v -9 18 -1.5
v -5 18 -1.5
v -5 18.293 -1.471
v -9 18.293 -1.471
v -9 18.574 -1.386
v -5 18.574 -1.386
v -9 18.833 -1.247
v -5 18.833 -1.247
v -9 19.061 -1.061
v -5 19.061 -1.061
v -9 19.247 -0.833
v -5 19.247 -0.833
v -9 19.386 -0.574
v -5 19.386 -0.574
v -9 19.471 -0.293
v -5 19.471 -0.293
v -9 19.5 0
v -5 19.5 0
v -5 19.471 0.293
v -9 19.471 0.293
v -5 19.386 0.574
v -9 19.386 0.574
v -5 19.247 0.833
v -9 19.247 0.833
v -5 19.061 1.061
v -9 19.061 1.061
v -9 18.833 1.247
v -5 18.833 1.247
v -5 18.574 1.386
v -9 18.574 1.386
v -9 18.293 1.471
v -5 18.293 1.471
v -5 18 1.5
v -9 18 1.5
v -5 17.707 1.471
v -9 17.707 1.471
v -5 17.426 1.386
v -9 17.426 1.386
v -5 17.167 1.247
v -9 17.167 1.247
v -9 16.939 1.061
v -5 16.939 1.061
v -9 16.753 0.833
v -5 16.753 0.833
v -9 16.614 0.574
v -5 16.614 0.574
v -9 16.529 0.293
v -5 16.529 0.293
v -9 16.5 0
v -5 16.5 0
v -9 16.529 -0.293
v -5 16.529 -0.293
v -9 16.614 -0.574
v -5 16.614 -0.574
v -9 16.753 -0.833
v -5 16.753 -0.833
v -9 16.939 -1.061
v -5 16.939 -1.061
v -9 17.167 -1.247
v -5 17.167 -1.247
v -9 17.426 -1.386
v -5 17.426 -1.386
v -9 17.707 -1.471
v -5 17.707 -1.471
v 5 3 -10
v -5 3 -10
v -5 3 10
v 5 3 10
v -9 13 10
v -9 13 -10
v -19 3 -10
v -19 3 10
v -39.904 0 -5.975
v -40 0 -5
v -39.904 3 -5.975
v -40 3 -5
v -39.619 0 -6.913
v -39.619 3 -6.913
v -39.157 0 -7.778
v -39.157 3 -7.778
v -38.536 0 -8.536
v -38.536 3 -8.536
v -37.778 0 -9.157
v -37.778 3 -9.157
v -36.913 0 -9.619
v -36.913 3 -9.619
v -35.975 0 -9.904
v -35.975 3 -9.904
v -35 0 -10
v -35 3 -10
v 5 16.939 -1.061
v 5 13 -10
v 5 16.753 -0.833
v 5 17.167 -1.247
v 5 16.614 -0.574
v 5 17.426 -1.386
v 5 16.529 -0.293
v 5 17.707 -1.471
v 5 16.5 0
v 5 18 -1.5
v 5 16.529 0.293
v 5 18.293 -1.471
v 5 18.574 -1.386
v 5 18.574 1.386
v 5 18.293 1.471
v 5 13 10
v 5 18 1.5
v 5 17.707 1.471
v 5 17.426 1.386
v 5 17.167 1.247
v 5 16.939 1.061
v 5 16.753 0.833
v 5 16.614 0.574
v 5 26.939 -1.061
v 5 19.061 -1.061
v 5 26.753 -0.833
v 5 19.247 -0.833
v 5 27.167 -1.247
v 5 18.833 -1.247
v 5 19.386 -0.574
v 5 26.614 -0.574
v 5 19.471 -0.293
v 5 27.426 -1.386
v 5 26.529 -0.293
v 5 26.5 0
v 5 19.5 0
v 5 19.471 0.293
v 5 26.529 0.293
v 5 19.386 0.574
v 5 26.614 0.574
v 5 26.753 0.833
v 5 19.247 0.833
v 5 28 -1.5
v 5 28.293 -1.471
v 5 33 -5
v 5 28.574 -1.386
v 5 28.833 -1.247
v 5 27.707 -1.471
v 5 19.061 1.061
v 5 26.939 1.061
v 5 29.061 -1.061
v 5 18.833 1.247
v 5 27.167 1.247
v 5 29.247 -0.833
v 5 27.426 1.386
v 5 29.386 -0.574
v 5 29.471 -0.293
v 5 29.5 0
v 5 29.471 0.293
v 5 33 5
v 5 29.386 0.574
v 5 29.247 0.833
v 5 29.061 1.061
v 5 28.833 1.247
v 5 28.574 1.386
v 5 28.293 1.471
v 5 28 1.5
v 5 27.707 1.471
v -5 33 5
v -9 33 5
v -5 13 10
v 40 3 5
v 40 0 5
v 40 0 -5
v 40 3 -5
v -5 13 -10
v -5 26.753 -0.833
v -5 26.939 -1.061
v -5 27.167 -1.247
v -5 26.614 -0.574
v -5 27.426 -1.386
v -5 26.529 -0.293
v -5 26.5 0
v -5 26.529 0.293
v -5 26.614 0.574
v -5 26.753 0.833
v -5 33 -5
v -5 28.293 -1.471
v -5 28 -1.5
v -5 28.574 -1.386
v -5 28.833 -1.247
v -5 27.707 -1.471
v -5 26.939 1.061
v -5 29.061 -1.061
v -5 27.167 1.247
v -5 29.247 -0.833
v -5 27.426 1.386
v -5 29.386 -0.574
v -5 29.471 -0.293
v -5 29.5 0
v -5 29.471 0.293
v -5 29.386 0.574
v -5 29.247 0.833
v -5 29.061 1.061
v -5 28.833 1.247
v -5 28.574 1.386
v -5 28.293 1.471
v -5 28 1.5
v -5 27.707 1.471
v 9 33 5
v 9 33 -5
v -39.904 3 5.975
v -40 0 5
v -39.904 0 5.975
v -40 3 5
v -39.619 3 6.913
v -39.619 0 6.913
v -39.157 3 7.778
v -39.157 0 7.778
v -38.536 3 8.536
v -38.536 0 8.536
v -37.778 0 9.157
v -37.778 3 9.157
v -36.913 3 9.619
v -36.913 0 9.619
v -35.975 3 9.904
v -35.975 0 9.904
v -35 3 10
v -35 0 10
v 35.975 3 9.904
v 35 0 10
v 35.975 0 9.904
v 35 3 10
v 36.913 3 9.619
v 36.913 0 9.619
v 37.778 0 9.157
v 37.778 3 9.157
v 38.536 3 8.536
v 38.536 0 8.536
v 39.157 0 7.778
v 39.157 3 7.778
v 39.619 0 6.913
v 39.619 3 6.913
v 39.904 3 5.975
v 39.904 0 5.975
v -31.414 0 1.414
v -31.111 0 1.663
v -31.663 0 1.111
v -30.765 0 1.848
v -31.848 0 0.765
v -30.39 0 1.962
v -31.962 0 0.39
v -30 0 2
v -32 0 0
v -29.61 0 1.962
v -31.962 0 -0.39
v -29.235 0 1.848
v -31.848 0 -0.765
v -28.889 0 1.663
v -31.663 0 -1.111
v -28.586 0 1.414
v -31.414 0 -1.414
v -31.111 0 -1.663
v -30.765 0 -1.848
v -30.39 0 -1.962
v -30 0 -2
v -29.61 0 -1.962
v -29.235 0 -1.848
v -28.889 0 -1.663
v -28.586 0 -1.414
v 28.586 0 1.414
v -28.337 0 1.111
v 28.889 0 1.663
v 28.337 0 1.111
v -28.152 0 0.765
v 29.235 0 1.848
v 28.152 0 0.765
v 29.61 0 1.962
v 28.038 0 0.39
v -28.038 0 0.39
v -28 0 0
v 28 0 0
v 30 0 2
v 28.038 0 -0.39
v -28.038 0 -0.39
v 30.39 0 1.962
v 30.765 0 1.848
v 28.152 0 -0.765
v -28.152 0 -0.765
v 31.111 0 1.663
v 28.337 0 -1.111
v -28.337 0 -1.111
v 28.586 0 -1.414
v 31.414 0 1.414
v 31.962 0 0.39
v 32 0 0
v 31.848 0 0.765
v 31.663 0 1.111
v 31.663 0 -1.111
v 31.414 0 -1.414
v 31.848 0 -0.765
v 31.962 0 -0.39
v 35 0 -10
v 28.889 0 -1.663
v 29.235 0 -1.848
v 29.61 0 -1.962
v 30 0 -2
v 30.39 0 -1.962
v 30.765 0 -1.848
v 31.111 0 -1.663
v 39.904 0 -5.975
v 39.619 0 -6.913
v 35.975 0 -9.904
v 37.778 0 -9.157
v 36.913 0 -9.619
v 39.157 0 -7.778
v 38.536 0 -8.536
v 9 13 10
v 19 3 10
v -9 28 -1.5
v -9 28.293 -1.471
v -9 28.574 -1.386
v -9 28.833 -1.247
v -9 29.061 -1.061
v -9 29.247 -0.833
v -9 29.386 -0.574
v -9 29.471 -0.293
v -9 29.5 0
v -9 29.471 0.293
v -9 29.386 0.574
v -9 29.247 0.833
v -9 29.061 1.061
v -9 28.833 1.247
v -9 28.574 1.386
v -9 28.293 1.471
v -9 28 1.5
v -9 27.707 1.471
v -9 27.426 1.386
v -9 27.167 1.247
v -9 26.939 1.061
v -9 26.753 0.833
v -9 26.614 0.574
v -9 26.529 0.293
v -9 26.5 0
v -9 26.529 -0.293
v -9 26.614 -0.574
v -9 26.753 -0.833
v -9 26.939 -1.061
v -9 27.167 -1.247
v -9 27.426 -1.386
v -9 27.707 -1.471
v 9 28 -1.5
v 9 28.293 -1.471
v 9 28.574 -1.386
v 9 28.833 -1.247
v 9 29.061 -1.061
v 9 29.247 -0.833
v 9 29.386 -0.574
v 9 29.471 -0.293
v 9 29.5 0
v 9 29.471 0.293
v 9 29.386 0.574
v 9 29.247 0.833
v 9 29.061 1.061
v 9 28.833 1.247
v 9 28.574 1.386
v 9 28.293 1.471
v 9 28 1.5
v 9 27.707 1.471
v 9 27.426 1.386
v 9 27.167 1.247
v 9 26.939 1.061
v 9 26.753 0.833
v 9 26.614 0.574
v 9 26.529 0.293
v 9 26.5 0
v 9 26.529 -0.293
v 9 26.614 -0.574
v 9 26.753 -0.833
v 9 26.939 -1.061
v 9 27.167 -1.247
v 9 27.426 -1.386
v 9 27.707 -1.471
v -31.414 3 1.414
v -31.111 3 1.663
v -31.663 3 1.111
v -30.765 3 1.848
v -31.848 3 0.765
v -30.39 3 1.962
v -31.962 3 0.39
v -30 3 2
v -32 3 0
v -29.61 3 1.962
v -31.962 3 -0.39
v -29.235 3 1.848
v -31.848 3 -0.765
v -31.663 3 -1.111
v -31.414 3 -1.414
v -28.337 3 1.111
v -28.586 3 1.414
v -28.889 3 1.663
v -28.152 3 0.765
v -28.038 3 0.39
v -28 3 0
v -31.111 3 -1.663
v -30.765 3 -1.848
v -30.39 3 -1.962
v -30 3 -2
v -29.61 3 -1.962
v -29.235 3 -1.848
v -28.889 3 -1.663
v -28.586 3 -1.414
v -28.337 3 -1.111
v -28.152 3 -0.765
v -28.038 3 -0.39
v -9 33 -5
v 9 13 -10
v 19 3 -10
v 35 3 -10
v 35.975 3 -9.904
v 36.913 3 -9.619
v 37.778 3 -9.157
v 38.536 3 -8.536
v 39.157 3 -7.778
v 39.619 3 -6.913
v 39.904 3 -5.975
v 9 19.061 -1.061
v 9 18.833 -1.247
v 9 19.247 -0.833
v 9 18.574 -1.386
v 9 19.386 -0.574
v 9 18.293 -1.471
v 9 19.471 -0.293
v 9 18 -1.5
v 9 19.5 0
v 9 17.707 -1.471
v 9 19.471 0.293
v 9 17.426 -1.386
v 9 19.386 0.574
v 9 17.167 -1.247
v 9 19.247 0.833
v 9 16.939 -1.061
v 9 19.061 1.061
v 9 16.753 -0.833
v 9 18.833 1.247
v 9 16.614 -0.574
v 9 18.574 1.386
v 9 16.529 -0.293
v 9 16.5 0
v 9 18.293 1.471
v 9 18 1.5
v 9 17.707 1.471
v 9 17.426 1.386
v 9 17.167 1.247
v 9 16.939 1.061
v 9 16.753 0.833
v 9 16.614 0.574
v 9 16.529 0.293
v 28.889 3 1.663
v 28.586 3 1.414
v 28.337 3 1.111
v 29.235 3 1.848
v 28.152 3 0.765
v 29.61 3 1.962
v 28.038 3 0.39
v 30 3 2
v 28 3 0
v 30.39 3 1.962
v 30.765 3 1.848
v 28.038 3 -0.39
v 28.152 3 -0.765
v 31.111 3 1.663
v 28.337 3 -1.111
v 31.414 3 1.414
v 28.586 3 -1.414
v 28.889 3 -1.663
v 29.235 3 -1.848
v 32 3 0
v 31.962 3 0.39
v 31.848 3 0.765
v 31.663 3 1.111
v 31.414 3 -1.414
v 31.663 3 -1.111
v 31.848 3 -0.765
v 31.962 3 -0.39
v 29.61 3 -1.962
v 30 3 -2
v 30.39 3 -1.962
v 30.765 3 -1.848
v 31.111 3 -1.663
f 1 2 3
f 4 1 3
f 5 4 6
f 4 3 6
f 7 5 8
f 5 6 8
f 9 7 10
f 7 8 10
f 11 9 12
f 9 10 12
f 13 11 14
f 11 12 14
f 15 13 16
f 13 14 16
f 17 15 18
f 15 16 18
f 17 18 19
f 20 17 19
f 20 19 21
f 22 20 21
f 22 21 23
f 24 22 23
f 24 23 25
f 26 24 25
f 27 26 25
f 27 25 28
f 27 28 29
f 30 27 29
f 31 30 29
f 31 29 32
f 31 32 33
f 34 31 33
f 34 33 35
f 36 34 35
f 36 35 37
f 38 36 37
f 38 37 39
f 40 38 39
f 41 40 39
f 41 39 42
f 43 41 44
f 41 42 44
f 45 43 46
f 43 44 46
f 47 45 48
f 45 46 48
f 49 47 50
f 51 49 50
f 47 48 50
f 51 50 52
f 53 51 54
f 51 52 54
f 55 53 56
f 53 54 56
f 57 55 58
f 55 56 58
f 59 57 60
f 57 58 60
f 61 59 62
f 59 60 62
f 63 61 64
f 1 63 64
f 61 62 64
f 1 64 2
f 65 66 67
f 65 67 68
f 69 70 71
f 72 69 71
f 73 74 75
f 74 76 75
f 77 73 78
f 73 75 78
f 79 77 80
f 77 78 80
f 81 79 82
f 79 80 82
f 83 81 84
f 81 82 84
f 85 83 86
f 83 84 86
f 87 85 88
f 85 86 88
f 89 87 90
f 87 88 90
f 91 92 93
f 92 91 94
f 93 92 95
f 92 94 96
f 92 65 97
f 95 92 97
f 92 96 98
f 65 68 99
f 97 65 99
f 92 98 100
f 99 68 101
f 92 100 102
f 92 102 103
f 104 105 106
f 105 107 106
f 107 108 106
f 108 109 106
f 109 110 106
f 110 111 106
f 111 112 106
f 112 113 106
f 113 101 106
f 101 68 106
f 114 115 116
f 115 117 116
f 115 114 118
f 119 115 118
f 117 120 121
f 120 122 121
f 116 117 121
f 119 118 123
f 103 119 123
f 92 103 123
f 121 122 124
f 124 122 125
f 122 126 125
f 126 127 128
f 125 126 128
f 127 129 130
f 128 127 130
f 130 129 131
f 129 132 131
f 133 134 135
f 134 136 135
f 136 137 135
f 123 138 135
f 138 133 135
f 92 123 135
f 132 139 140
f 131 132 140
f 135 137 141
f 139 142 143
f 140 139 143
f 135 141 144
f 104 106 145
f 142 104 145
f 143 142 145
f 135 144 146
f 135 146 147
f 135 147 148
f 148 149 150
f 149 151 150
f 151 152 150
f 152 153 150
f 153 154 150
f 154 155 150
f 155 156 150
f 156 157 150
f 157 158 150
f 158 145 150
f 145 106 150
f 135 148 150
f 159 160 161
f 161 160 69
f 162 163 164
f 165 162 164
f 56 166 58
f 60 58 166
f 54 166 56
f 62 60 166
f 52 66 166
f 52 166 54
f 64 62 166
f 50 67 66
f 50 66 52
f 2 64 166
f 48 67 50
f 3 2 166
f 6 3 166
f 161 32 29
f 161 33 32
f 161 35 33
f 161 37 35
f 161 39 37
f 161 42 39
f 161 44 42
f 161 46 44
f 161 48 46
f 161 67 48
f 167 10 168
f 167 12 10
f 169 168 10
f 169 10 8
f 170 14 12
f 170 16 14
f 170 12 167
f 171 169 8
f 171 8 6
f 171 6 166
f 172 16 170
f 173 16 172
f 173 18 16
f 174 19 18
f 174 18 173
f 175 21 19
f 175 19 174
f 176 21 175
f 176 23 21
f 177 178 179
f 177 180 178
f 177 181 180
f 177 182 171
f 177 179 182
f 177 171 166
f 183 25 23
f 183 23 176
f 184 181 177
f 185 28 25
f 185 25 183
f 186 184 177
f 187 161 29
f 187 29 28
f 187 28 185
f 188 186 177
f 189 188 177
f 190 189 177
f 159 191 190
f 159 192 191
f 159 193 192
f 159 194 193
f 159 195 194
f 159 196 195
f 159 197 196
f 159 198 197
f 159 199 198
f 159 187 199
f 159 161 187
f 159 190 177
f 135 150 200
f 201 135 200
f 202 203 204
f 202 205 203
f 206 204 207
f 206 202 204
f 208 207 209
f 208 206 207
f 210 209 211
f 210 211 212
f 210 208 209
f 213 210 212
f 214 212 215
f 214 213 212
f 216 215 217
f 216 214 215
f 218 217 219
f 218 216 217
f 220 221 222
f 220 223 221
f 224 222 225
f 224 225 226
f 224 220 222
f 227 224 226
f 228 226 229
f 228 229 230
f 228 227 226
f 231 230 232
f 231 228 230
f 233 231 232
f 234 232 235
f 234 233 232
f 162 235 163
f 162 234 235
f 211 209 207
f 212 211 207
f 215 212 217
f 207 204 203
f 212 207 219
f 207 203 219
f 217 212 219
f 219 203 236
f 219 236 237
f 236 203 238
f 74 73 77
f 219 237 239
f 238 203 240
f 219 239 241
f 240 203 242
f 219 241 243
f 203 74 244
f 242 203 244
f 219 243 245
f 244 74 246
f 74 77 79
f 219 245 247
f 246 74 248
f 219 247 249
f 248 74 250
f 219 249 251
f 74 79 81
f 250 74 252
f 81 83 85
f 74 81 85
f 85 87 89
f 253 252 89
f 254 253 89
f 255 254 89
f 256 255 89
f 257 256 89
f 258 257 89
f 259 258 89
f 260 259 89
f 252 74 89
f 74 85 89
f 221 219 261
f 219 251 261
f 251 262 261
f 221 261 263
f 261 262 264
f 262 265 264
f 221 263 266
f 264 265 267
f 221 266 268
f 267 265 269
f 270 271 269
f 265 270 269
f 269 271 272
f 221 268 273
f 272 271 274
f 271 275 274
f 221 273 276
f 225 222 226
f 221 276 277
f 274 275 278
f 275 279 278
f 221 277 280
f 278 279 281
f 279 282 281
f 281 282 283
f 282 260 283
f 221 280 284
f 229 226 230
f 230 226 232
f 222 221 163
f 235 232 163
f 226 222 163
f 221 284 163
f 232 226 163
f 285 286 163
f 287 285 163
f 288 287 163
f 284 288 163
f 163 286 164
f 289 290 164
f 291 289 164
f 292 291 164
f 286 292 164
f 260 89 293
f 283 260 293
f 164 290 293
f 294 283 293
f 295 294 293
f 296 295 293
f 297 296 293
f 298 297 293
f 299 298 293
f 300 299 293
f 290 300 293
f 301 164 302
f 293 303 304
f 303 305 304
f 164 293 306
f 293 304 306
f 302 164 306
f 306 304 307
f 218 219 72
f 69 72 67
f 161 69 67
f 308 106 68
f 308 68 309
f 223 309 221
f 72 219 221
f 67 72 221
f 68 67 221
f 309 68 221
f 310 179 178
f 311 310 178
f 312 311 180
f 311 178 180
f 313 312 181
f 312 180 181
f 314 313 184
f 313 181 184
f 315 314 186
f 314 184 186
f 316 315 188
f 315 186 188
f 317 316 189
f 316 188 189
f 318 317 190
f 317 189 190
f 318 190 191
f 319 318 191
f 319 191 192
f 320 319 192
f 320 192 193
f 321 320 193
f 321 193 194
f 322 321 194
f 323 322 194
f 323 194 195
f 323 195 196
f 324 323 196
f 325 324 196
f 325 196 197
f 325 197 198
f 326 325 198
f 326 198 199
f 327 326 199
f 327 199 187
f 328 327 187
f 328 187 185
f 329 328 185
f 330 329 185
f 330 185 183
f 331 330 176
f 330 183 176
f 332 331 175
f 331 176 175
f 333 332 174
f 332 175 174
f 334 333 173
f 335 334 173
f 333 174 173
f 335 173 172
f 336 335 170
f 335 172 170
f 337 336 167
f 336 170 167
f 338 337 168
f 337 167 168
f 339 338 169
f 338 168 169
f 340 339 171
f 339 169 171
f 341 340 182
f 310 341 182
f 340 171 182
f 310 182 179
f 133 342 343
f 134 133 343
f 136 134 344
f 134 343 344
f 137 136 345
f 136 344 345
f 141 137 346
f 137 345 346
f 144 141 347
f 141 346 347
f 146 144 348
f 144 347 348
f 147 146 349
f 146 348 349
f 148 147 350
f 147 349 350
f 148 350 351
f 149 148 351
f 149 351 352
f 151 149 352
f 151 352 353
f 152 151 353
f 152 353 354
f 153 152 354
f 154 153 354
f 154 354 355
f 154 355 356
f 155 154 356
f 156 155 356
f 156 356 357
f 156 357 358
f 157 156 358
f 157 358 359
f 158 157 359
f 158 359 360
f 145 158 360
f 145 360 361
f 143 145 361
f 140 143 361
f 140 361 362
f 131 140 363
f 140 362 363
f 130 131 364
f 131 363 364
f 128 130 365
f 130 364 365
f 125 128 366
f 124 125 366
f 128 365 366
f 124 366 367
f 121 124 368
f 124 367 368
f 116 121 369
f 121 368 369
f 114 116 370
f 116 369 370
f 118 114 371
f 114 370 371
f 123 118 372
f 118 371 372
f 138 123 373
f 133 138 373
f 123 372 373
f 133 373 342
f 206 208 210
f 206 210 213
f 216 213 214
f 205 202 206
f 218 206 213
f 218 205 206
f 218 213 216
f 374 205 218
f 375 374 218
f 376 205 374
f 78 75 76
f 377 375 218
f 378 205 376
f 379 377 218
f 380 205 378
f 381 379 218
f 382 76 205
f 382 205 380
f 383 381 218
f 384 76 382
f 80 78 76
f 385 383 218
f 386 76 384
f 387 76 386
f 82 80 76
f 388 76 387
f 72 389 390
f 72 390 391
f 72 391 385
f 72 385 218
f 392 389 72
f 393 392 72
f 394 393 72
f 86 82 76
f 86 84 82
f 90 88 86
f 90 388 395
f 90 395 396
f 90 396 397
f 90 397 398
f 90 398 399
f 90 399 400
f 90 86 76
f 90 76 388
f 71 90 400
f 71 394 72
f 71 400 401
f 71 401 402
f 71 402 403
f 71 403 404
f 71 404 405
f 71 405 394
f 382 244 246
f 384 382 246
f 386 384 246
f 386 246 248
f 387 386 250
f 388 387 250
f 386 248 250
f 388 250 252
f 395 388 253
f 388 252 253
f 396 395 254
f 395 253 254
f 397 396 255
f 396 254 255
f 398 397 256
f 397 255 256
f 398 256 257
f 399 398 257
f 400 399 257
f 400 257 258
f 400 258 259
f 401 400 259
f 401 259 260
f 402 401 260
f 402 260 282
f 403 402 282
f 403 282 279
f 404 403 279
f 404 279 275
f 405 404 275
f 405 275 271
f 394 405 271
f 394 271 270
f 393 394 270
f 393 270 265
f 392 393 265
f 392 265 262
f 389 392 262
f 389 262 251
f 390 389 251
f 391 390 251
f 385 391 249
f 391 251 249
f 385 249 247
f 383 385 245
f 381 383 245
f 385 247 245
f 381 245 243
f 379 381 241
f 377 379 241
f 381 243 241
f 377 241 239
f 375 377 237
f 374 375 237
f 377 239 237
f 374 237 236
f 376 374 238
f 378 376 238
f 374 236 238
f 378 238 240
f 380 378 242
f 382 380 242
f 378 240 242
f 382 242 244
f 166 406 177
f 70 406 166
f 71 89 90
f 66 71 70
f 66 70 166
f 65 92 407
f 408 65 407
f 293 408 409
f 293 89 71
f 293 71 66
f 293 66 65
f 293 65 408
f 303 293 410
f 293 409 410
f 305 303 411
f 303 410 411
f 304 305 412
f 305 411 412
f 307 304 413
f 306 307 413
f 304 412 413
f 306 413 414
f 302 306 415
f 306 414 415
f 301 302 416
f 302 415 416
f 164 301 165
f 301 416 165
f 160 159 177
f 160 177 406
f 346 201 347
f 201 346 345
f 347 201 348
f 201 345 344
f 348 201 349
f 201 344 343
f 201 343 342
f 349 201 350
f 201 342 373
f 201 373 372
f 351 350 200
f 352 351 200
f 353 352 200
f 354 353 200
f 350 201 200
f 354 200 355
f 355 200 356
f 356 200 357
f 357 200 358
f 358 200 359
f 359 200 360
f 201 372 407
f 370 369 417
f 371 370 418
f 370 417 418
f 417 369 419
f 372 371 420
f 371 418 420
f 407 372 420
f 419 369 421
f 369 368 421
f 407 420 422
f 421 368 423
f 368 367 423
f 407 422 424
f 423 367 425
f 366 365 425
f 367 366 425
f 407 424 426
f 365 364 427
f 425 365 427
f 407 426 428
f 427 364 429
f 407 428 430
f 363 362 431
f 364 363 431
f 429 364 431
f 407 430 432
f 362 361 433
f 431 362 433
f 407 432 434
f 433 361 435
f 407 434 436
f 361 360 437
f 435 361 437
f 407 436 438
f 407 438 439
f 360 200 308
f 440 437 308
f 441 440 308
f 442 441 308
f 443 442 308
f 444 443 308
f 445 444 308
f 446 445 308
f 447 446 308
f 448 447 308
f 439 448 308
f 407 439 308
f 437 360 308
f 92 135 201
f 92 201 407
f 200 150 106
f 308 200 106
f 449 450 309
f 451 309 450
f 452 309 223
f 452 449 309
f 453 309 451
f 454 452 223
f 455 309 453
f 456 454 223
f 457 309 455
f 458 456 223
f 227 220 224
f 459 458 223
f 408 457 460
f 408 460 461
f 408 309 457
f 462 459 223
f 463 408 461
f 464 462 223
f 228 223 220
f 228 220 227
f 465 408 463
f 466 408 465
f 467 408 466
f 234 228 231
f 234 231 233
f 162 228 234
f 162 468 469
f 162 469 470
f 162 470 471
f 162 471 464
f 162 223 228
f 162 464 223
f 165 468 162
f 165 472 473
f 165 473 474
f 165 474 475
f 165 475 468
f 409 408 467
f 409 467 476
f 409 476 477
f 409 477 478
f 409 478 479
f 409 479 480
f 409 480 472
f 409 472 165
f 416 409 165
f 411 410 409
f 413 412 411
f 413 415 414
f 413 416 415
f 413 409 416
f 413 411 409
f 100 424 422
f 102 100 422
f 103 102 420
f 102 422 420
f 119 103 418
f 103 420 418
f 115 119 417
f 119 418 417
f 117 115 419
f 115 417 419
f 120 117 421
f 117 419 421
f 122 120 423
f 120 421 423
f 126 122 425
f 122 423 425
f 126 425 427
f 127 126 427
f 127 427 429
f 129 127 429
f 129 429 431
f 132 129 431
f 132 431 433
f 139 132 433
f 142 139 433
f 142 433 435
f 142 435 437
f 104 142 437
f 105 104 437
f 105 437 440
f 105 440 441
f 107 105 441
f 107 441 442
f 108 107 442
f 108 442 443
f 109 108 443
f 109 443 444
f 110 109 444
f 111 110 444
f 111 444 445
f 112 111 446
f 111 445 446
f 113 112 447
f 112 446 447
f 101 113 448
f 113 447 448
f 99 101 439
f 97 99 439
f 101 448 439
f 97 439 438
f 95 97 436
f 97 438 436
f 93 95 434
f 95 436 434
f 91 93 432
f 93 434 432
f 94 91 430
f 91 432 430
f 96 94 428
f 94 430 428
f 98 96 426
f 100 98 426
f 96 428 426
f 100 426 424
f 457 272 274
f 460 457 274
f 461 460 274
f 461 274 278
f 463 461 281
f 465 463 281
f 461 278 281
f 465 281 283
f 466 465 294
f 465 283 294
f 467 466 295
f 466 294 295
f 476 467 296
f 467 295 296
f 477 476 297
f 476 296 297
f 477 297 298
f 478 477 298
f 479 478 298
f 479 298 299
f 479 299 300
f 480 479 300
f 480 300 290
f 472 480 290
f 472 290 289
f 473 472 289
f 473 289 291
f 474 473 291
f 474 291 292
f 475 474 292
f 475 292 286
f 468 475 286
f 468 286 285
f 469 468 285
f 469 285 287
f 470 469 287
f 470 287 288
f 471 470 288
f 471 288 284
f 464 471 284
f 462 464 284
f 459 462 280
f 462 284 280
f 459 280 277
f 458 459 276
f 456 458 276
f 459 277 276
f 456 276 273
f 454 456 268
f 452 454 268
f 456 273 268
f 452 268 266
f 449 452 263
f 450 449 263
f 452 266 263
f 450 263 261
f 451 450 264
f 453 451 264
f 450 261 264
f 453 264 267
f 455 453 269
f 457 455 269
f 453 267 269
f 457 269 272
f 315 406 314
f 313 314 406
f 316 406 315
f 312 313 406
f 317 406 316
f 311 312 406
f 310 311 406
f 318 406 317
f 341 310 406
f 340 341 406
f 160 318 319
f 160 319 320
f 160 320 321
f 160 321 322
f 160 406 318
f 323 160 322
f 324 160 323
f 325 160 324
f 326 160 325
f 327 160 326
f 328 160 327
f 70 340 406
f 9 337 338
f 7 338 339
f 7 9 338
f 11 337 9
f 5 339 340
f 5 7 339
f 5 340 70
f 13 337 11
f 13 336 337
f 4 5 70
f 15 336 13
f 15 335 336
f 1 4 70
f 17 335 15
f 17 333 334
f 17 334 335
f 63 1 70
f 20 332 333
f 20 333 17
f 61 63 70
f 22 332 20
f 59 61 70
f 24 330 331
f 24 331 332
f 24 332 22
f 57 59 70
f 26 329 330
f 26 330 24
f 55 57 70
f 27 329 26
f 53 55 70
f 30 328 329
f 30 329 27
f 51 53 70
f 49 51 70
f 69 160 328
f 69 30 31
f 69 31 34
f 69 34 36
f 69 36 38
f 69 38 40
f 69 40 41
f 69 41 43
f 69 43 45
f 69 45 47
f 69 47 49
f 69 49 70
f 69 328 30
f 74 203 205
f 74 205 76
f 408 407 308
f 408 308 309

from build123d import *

# Parameters (mm, degrees)
SKETCH_2_W            = 80
SKETCH_2_H            = 20
EXTRUDE_1_DEPTH       = 3
EXTRUDE_2_DEPTH       = 20
HOLE_WIZARD_3_0_3_1_D = 3
HOLE_WIZARD_4_0_4_1_D = 4
CUT_EXTRUDE_1_DEPTH   = 200
FILLET_1_R            = 5


with BuildPart() as part:
    # 草图2 → 凸台-拉伸1 (new body)
    with BuildSketch(Plane(origin=(0, 0, 0), x_dir=(1, 0, 0), z_dir=(0, 1, 0))):
        Rectangle(SKETCH_2_W, SKETCH_2_H)
    extrude(amount=EXTRUDE_1_DEPTH)

    # 草图3 → 凸台-拉伸2 (add)
    with BuildSketch(Plane.XY.offset(10)):
        Polygon((-9, 13), (-19, 3), (-5, 3), (-5, 33), (-9, 33), align=None)
    extrude_2 = extrude(amount=-EXTRUDE_2_DEPTH)

    # 镜向1: 凸台-拉伸2 across plane
    add(extrude_2.mirror(Plane.ZY))

    # Ø3.0 (3) 直径孔1 (through all)
    with Locations(Plane.ZY.offset(9)):
        with Locations((0, 28), (0, 18)):
            Hole(HOLE_WIZARD_3_0_3_1_D / 2)

    # Ø4.0 (4) 直径孔1 (through all)
    with Locations(Plane(origin=(0, 3, 0), x_dir=(1, 0, 0), z_dir=(0, 1, 0))):
        with Locations((-30, 0), (30, 0)):
            Hole(HOLE_WIZARD_4_0_4_1_D / 2)

    # 草图10 → 切除-拉伸1 (cut)
    with BuildSketch(Plane.ZY.offset(9)):
        Polygon((10, 13), (10, 33), (5, 33), align=None)
        Polygon((-10, 13), (-10, 33), (-5, 33), align=None)
    extrude(amount=-CUT_EXTRUDE_1_DEPTH, mode=Mode.SUBTRACT)

    # 圆角1
    fillet_1_edges = [part.edges().sort_by_distance(p)[0] for p in [
        (40, 1.5, -10),
        (40, 1.5, 10),
        (-40, 1.5, 10),
        (-40, 1.5, -10),
    ]]
    fillet(fillet_1_edges, radius=FILLET_1_R)


solid = part.part
